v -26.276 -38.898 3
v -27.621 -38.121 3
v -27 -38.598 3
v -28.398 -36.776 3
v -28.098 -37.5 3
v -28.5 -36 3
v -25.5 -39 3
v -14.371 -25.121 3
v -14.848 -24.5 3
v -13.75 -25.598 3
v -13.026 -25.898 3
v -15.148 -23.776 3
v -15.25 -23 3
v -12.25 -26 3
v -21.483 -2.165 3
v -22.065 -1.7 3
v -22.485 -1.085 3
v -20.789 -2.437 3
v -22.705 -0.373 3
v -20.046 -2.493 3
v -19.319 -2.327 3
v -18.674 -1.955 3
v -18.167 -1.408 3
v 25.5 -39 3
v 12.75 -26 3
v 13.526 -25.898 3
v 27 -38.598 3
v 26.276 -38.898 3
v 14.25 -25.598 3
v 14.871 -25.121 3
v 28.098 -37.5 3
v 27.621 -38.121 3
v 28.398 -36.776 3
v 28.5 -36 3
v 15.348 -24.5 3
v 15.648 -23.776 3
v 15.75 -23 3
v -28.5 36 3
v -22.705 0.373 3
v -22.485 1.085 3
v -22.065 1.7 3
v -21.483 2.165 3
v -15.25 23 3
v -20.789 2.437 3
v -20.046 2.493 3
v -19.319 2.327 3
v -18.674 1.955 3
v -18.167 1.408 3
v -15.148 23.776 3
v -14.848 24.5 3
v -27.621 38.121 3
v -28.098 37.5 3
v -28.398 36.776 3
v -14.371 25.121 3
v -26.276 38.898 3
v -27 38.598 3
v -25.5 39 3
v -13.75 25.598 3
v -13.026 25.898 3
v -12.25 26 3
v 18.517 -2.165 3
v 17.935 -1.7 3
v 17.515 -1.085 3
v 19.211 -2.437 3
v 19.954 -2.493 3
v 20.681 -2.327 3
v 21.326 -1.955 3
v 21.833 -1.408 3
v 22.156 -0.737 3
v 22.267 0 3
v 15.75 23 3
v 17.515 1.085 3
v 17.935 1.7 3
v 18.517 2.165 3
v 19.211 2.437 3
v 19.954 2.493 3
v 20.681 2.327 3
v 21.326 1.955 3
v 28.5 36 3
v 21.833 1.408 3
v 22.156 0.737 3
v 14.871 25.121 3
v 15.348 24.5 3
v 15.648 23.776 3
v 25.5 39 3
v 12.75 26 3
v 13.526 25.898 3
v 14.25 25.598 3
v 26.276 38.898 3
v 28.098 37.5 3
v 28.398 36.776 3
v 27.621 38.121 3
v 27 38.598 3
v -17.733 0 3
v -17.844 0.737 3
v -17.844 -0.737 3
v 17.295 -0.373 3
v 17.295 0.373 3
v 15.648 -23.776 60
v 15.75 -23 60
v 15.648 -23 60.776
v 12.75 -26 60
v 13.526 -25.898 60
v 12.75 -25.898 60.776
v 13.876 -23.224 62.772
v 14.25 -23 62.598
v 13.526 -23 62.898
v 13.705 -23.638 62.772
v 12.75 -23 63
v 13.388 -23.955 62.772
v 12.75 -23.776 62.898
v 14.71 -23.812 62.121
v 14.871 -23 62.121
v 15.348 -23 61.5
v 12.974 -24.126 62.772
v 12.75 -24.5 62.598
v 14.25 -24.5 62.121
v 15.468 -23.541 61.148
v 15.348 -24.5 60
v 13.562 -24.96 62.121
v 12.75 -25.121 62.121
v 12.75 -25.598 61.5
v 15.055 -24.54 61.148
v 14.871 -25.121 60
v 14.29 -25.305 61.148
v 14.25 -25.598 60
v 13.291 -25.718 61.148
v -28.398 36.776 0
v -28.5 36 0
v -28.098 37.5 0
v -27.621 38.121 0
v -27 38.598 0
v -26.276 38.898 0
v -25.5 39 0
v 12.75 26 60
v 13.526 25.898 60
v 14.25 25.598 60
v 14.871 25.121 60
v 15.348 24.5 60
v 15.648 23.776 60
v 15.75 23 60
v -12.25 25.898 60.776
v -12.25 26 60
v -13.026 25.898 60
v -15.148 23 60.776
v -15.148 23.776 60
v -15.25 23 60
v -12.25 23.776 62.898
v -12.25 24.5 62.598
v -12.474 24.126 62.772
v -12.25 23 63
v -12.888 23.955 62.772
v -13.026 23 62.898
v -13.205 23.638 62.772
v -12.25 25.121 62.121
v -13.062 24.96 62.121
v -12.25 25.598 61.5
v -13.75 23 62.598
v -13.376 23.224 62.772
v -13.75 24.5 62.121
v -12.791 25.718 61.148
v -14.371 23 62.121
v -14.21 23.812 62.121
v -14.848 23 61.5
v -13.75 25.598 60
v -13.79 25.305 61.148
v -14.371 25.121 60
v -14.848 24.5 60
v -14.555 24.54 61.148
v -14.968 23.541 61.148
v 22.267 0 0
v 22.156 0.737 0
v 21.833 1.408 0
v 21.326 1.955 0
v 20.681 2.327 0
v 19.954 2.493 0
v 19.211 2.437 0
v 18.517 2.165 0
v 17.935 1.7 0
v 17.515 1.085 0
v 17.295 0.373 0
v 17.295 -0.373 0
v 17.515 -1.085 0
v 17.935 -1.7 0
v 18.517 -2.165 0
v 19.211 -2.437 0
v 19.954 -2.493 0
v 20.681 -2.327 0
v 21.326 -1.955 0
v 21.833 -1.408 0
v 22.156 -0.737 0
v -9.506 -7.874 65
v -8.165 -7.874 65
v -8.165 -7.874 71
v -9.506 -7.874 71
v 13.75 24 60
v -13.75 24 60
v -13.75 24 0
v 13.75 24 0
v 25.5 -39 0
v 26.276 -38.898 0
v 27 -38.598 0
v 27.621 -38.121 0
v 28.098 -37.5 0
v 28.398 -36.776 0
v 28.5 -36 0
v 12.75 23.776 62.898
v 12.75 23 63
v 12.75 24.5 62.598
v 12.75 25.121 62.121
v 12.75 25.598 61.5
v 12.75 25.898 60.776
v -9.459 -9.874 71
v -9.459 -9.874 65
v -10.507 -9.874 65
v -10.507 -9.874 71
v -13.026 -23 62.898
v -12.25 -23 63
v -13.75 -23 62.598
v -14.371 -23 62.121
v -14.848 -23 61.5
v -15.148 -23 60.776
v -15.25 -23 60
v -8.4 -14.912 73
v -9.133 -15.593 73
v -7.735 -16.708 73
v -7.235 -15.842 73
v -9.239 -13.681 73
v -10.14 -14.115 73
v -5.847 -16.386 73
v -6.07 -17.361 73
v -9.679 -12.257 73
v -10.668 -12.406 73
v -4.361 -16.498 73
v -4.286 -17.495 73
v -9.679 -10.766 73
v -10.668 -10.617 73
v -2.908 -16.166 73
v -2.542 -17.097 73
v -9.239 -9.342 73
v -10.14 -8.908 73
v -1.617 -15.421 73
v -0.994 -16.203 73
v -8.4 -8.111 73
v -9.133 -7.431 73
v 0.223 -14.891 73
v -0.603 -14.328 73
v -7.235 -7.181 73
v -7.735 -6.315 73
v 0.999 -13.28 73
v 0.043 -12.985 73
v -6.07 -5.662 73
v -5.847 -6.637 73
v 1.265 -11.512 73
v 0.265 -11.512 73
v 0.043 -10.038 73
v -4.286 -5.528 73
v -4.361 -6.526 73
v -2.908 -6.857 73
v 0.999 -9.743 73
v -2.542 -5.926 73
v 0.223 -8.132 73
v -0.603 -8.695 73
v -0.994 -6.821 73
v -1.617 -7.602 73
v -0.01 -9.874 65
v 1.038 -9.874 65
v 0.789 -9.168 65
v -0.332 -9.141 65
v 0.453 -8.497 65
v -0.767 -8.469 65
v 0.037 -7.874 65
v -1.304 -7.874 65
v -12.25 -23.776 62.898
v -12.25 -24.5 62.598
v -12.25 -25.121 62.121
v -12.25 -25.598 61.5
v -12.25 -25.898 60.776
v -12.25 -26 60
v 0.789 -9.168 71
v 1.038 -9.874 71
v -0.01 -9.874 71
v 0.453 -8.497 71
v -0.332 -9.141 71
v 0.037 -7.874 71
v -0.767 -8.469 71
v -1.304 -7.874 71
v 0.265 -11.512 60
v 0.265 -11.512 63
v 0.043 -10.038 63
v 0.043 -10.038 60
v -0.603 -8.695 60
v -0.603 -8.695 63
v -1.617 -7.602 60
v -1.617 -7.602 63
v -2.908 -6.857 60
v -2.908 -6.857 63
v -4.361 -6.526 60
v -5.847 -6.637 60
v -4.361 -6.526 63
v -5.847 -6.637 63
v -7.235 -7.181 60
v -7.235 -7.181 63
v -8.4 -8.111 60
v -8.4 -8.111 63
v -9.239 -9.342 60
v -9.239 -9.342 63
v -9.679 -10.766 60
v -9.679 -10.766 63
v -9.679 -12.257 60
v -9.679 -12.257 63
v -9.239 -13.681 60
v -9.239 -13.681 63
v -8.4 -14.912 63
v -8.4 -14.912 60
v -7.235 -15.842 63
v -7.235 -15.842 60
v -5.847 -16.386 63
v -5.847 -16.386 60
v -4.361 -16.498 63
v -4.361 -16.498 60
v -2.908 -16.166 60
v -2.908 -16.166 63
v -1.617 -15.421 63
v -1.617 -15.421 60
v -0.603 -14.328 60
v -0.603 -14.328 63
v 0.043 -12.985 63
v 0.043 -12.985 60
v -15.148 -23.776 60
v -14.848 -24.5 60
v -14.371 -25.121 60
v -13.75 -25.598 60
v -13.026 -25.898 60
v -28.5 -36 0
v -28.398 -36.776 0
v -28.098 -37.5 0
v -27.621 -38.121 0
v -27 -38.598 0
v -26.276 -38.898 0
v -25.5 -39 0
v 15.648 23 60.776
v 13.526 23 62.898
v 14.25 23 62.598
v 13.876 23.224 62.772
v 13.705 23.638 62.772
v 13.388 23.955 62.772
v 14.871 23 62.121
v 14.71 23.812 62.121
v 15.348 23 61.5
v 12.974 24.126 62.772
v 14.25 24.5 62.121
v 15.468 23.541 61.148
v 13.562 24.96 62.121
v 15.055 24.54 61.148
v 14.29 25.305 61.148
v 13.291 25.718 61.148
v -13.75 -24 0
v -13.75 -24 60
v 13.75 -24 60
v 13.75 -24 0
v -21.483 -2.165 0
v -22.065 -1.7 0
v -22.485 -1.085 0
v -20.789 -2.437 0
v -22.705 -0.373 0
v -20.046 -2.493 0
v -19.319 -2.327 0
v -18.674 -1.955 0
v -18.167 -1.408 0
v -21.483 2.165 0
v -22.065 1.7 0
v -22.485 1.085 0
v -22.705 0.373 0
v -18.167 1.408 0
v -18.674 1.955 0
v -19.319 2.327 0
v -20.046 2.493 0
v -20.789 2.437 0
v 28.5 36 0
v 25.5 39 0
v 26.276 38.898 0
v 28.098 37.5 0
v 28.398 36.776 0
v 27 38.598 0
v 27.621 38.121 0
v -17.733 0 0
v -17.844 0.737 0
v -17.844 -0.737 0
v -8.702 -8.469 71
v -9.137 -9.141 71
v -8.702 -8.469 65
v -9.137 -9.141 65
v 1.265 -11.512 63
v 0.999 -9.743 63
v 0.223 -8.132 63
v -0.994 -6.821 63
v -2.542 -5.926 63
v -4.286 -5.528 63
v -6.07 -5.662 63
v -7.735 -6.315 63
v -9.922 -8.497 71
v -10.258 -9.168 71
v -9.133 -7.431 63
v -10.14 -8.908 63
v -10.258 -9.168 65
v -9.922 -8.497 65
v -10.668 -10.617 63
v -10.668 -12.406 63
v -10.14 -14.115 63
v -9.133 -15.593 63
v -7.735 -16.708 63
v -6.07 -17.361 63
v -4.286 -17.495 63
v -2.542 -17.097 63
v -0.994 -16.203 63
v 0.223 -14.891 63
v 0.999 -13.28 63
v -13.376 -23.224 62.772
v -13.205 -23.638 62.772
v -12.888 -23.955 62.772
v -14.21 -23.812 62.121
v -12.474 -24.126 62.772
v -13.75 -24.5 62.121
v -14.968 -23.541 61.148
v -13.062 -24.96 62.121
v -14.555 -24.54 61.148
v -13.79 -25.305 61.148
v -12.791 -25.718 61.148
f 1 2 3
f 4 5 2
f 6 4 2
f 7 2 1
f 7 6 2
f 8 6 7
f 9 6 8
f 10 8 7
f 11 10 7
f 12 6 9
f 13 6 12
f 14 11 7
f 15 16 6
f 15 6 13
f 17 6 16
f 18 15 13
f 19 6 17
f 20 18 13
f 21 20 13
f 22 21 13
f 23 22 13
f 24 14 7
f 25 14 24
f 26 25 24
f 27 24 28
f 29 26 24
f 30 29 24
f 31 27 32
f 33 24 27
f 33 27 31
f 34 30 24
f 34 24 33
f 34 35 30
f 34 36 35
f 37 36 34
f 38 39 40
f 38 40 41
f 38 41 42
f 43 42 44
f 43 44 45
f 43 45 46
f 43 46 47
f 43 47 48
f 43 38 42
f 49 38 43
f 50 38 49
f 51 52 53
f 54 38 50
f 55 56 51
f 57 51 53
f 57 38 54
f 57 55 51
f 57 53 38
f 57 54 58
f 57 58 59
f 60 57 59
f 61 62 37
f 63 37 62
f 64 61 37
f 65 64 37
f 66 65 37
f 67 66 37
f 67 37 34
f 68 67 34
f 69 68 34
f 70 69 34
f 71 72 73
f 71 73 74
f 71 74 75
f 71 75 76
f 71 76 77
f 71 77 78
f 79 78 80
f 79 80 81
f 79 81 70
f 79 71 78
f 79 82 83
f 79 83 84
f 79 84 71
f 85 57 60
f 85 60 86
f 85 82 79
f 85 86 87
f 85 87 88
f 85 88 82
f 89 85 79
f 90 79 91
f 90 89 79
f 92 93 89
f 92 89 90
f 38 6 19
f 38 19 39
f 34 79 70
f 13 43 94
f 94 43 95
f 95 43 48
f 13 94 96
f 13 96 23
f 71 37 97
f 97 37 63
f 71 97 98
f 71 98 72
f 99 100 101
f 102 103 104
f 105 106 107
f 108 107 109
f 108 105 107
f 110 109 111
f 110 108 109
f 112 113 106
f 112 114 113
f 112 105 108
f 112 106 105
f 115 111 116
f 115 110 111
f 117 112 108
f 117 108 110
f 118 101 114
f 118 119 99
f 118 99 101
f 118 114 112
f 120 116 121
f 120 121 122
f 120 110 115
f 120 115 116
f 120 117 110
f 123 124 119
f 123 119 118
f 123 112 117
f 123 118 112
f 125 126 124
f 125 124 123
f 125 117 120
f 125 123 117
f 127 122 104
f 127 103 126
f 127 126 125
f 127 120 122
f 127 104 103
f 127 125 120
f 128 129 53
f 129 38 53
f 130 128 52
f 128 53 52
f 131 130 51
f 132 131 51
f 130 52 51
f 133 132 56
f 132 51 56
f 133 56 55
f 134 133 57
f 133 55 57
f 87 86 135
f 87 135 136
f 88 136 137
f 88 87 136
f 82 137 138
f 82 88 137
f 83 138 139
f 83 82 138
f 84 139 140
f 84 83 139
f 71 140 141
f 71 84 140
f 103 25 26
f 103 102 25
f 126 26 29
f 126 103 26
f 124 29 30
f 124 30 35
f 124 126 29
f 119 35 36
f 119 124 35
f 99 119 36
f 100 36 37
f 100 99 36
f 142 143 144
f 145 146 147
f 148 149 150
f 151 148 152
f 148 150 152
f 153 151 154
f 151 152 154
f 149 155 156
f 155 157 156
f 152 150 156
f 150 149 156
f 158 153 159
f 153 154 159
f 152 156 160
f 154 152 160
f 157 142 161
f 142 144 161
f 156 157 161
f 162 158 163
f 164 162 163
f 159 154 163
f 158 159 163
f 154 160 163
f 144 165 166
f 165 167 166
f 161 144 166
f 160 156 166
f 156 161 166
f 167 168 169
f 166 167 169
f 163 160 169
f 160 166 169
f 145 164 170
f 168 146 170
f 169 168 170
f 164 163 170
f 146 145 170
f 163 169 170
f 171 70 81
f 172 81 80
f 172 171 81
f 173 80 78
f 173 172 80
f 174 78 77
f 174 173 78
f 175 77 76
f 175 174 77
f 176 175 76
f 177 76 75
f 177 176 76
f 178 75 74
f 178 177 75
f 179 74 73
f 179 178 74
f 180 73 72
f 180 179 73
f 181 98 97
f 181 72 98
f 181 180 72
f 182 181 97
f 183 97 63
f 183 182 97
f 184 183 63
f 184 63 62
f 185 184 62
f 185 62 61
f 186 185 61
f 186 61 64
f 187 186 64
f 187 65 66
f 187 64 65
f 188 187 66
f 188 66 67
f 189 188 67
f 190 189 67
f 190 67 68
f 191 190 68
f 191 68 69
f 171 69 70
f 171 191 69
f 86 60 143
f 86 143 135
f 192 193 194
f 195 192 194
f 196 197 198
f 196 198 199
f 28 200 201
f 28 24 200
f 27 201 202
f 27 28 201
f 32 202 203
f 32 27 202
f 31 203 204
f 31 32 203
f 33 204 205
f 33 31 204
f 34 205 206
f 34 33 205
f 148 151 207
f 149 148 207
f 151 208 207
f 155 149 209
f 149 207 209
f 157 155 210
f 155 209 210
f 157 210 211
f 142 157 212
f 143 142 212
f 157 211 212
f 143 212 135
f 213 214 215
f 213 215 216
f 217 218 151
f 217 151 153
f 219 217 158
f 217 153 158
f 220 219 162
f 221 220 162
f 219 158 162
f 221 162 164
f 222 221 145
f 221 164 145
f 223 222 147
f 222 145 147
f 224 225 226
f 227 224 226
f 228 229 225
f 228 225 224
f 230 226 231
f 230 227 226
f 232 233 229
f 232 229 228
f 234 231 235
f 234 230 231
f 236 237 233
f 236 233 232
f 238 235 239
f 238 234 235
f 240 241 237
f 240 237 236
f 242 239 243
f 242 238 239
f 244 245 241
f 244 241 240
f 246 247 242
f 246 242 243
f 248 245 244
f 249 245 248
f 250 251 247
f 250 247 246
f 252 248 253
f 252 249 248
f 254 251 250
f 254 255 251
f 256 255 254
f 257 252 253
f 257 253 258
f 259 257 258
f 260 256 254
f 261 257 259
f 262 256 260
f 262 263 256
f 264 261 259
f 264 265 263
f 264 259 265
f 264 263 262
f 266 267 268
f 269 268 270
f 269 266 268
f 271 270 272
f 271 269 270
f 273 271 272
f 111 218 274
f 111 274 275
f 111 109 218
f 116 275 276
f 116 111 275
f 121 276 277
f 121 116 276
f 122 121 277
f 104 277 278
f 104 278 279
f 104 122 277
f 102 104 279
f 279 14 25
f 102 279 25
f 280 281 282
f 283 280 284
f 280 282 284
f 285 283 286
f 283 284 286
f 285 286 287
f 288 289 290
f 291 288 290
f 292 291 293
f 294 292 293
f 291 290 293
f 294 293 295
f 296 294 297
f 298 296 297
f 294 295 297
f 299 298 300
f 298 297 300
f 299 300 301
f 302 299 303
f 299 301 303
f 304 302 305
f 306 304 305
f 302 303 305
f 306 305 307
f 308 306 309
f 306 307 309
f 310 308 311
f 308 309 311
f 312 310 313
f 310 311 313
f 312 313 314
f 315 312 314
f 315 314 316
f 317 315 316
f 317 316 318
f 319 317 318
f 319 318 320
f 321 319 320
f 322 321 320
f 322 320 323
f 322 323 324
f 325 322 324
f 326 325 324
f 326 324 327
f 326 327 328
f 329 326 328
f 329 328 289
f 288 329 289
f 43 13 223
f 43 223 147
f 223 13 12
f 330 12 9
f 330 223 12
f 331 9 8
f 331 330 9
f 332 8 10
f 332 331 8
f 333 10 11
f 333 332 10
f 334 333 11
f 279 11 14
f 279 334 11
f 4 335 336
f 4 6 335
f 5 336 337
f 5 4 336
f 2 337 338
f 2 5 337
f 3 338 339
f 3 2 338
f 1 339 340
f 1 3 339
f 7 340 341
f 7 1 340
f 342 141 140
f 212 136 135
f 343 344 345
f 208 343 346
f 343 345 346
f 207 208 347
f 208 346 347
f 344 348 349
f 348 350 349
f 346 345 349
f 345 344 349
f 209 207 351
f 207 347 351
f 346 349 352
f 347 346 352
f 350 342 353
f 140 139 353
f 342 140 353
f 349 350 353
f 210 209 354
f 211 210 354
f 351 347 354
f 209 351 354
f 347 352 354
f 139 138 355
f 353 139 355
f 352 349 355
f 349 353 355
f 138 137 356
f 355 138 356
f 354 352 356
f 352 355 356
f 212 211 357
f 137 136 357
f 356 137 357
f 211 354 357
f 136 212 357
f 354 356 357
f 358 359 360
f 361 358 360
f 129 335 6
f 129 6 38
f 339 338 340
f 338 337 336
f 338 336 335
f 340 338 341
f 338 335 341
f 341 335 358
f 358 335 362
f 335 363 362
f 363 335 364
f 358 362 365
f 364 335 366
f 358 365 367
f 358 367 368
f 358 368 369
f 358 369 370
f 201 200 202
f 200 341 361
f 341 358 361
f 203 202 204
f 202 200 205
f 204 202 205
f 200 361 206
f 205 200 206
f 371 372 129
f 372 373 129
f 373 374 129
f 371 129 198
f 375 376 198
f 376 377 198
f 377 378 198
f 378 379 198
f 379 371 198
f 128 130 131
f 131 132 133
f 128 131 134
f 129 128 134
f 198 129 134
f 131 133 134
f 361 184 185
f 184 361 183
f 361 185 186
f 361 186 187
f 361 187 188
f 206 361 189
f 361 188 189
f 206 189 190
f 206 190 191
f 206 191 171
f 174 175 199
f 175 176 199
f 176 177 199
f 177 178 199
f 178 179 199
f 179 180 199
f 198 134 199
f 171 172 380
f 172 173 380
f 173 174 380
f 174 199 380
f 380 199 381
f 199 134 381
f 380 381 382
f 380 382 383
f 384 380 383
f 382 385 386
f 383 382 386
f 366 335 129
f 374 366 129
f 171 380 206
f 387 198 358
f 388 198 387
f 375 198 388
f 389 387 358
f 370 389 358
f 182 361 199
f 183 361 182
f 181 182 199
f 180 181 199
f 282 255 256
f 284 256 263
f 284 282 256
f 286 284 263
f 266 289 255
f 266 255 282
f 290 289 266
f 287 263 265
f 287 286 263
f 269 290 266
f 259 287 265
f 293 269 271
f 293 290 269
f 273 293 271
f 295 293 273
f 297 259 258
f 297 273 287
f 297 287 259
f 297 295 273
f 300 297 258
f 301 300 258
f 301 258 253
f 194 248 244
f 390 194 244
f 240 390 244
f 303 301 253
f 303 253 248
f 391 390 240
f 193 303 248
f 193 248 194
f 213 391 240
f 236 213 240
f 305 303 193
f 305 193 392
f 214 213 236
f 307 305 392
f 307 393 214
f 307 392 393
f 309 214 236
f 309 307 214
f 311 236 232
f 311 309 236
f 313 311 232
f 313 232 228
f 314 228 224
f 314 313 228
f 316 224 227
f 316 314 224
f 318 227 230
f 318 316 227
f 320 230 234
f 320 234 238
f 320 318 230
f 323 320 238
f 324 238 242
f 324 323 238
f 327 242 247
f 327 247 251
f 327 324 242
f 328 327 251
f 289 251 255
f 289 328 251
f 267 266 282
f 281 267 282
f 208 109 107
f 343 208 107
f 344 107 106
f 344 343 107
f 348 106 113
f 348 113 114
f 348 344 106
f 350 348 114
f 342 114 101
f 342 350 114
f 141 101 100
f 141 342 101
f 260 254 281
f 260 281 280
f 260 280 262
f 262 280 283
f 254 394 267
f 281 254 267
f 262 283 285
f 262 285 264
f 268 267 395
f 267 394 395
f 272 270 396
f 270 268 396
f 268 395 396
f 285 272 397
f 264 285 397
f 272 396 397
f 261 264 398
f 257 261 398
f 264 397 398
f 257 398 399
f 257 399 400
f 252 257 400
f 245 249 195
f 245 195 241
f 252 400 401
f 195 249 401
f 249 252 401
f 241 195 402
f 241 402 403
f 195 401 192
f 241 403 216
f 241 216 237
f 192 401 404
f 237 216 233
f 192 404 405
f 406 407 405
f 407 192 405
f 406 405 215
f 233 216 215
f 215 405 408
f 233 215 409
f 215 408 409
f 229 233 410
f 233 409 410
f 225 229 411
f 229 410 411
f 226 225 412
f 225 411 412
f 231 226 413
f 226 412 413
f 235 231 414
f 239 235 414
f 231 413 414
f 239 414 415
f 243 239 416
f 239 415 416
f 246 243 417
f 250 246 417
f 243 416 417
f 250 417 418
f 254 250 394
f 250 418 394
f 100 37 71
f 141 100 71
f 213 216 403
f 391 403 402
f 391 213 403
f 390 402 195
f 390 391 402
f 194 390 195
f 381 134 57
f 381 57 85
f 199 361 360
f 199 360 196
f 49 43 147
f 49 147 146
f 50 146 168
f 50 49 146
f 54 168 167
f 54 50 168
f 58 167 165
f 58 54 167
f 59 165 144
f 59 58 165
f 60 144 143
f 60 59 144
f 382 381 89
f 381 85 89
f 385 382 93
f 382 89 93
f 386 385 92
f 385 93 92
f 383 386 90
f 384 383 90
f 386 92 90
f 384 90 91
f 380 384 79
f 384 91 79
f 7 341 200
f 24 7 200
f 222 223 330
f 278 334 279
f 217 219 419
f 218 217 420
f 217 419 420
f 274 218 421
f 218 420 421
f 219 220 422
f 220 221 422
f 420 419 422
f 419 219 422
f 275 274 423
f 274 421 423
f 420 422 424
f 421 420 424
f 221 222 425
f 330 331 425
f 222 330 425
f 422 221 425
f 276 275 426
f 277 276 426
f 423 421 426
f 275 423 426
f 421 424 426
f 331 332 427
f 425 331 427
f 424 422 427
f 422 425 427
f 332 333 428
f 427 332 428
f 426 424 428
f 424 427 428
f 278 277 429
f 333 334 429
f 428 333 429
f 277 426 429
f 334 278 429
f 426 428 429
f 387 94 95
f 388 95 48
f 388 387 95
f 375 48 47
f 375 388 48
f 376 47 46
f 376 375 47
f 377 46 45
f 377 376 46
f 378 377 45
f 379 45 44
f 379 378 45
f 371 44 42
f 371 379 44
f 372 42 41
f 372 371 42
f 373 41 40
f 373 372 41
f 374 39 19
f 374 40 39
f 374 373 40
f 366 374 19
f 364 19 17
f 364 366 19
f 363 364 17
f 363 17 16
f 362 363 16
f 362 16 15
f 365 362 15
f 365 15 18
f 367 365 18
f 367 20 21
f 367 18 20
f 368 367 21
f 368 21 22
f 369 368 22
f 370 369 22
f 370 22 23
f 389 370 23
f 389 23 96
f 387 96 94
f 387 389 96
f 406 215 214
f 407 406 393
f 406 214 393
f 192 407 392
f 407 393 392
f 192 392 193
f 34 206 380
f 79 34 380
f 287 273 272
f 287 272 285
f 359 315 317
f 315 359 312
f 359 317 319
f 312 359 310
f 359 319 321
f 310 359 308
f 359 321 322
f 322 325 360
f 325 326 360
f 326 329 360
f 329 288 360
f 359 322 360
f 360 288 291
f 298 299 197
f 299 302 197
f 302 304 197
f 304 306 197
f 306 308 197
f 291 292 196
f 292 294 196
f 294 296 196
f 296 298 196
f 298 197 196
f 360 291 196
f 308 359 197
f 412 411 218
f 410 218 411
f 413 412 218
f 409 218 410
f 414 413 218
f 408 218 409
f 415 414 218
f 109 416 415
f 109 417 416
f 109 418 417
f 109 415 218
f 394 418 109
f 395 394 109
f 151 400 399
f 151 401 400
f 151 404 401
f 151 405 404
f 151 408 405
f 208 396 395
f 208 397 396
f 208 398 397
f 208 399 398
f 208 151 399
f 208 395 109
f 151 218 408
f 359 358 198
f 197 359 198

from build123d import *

# Parameters (mm, degrees)
F0_W           = 31
F0_H           = 52
F0_W_2         = 27.5
F0_H_2         = 48
F1_DEPTH       = 60
F0_W_3         = 57
F0_H_3         = 78
F2_DEPTH       = 3
F3_W           = 31
F3_H           = 52
F3_W_2         = 27.5
F3_H_2         = 48
F4_DEPTH       = 3
F5_R           = 5
F6_DEPTH       = 4
F5_R_2         = 6
F7_DEPTH       = 10
F8_R           = 2.5
F9_DEPTH       = 5
F10_R          = 3
F11_W          = 2
F11_H          = 6
F12_DEPTH      = 15
F12_DEPTH_BACK = 15


with BuildPart() as f1:
    # F0 (on Top) → F1 (new body)
    with BuildSketch(Plane.XY):
        with Locations((0.25, 0)):
            Rectangle(F0_W, F0_H)
        Rectangle(F0_W_2, F0_H_2, mode=Mode.SUBTRACT)
    extrude(amount=F1_DEPTH)

    # F0 (on Top) → F2 (join)
    with BuildSketch(Plane.XY):
        Rectangle(F0_W_3, F0_H_3)
        with Locations((0.25, 0)):
            Rectangle(F0_W, F0_H, mode=Mode.SUBTRACT)
    extrude(amount=F2_DEPTH)

    # F3 (on face) → F4 (join)
    with BuildSketch(Plane.XY.offset(60)):
        with Locations((0.25, 0)):
            Rectangle(F3_W, F3_H)
        Rectangle(F3_W_2, F3_H_2, mode=Mode.SUBTRACT)
        Rectangle(F3_W_2, F3_H_2)
    extrude(amount=F4_DEPTH)

    # F5 (on face) → F6 (cut)
    with BuildSketch(Plane.XY.offset(63)):
        with Locations((-4.7345235944, -11.5115633234)):
            Circle(F5_R)
    extrude(amount=-F6_DEPTH, mode=Mode.SUBTRACT)

    # F5 (on face) → F7 (join)
    with BuildSketch(Plane.XY.offset(63)):
        with Locations((-4.7345235944, -11.5115633234)):
            Circle(F5_R_2)
        with Locations((-4.7345235944, -11.5115633234)):
            Circle(F5_R, mode=Mode.SUBTRACT)
    extrude(amount=F7_DEPTH)

    # F8 (on face) → F9 (cut)
    with BuildSketch(Plane.XY):
        with Locations((-20.2327246665, 0)):
            Circle(F8_R)
        with Locations((19.7672753335, 0)):
            Circle(F8_R)
    extrude(amount=F9_DEPTH, mode=Mode.SUBTRACT)

    # F10
    f10_edges = [f1.edges().sort_by_distance(p)[0] for p in [
        (28.5, 39, 1.5),
        (28.5, -39, 1.5),
        (-28.5, 39, 1.5),
        (-28.5, -39, 1.5),
        (-15.25, 26, 33),
        (15.75, 26, 33),
        (-15.25, -26, 33),
        (15.75, -26, 33),
        (15.75, 0, 63),
        (0.25, 26, 63),
        (-15.25, 0, 63),
        (0.25, -26, 63),
    ]]
    fillet(f10_edges, radius=F10_R)

    # F11 (on Right) → F12 (cut, two sides)
    with BuildSketch(Plane.YZ) as f12_sk:
        with Locations((-8.8742363974, 68)):
            Rectangle(F11_W, F11_H)
    extrude(amount=-F12_DEPTH, mode=Mode.SUBTRACT)
    extrude(f12_sk.sketch, amount=F12_DEPTH_BACK, mode=Mode.SUBTRACT)


solid = f1.part
